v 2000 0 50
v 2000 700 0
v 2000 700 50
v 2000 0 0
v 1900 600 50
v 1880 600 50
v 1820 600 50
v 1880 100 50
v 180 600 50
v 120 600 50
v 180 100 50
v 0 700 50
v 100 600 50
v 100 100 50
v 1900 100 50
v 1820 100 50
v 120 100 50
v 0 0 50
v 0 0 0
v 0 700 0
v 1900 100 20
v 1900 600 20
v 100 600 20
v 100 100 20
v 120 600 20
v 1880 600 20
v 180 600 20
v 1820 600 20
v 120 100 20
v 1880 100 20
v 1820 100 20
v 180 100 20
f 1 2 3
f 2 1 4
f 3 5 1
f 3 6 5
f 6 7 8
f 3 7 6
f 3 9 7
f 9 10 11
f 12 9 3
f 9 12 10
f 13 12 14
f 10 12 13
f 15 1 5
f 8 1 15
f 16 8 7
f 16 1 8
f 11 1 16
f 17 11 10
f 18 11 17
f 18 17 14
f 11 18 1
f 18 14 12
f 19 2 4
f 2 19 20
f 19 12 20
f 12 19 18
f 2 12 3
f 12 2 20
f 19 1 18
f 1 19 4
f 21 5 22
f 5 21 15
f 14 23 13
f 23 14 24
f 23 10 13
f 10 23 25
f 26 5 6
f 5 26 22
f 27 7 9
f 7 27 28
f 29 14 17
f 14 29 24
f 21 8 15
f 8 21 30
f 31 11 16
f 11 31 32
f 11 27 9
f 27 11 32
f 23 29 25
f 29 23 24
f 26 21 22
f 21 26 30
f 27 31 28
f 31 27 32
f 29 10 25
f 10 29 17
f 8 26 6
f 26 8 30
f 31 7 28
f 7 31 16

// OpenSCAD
// Table top — 200x70cm
// Border: 10cm wide, 5cm thick
// Center plank: 2cm thick
// Base: 1700mm wide, centered — arms at 150mm from each edge

width          = 2000;  // 200cm
depth          =  700;  // 70cm
border_width   =  100;  // 10cm
border_thick   =   50;  // 5cm
plank_thick    =   20;  // 2cm

base_width     = 1700;  // base at max stretch
arm_width      =   60;  // arm contact width (X)
gap_fill       = border_thick - plank_thick;  // 30mm
arm_overhang   = (width - base_width) / 2;    // 150mm each side

// Border frame — dark walnut
color([0.36, 0.20, 0.09])
difference() {
    cube([width, depth, border_thick]);
    translate([border_width, border_width, 0])
        cube([width - 2*border_width, depth - 2*border_width, border_thick]);
}

// Center plank — lighter oak
color([0.65, 0.40, 0.18])
translate([border_width, border_width, 0])
    cube([width - 2*border_width, depth - 2*border_width, plank_thick]);

// Arm support planks — fill gap where base arms sit
// Centered at arm_overhang from each edge, spanning full inner depth
color([0.45, 0.26, 0.10])
for (arm_x = [arm_overhang - arm_width/2, width - arm_overhang - arm_width/2])
    translate([arm_x, border_width, plank_thick])
        cube([arm_width, depth - 2*border_width, gap_fill]);
